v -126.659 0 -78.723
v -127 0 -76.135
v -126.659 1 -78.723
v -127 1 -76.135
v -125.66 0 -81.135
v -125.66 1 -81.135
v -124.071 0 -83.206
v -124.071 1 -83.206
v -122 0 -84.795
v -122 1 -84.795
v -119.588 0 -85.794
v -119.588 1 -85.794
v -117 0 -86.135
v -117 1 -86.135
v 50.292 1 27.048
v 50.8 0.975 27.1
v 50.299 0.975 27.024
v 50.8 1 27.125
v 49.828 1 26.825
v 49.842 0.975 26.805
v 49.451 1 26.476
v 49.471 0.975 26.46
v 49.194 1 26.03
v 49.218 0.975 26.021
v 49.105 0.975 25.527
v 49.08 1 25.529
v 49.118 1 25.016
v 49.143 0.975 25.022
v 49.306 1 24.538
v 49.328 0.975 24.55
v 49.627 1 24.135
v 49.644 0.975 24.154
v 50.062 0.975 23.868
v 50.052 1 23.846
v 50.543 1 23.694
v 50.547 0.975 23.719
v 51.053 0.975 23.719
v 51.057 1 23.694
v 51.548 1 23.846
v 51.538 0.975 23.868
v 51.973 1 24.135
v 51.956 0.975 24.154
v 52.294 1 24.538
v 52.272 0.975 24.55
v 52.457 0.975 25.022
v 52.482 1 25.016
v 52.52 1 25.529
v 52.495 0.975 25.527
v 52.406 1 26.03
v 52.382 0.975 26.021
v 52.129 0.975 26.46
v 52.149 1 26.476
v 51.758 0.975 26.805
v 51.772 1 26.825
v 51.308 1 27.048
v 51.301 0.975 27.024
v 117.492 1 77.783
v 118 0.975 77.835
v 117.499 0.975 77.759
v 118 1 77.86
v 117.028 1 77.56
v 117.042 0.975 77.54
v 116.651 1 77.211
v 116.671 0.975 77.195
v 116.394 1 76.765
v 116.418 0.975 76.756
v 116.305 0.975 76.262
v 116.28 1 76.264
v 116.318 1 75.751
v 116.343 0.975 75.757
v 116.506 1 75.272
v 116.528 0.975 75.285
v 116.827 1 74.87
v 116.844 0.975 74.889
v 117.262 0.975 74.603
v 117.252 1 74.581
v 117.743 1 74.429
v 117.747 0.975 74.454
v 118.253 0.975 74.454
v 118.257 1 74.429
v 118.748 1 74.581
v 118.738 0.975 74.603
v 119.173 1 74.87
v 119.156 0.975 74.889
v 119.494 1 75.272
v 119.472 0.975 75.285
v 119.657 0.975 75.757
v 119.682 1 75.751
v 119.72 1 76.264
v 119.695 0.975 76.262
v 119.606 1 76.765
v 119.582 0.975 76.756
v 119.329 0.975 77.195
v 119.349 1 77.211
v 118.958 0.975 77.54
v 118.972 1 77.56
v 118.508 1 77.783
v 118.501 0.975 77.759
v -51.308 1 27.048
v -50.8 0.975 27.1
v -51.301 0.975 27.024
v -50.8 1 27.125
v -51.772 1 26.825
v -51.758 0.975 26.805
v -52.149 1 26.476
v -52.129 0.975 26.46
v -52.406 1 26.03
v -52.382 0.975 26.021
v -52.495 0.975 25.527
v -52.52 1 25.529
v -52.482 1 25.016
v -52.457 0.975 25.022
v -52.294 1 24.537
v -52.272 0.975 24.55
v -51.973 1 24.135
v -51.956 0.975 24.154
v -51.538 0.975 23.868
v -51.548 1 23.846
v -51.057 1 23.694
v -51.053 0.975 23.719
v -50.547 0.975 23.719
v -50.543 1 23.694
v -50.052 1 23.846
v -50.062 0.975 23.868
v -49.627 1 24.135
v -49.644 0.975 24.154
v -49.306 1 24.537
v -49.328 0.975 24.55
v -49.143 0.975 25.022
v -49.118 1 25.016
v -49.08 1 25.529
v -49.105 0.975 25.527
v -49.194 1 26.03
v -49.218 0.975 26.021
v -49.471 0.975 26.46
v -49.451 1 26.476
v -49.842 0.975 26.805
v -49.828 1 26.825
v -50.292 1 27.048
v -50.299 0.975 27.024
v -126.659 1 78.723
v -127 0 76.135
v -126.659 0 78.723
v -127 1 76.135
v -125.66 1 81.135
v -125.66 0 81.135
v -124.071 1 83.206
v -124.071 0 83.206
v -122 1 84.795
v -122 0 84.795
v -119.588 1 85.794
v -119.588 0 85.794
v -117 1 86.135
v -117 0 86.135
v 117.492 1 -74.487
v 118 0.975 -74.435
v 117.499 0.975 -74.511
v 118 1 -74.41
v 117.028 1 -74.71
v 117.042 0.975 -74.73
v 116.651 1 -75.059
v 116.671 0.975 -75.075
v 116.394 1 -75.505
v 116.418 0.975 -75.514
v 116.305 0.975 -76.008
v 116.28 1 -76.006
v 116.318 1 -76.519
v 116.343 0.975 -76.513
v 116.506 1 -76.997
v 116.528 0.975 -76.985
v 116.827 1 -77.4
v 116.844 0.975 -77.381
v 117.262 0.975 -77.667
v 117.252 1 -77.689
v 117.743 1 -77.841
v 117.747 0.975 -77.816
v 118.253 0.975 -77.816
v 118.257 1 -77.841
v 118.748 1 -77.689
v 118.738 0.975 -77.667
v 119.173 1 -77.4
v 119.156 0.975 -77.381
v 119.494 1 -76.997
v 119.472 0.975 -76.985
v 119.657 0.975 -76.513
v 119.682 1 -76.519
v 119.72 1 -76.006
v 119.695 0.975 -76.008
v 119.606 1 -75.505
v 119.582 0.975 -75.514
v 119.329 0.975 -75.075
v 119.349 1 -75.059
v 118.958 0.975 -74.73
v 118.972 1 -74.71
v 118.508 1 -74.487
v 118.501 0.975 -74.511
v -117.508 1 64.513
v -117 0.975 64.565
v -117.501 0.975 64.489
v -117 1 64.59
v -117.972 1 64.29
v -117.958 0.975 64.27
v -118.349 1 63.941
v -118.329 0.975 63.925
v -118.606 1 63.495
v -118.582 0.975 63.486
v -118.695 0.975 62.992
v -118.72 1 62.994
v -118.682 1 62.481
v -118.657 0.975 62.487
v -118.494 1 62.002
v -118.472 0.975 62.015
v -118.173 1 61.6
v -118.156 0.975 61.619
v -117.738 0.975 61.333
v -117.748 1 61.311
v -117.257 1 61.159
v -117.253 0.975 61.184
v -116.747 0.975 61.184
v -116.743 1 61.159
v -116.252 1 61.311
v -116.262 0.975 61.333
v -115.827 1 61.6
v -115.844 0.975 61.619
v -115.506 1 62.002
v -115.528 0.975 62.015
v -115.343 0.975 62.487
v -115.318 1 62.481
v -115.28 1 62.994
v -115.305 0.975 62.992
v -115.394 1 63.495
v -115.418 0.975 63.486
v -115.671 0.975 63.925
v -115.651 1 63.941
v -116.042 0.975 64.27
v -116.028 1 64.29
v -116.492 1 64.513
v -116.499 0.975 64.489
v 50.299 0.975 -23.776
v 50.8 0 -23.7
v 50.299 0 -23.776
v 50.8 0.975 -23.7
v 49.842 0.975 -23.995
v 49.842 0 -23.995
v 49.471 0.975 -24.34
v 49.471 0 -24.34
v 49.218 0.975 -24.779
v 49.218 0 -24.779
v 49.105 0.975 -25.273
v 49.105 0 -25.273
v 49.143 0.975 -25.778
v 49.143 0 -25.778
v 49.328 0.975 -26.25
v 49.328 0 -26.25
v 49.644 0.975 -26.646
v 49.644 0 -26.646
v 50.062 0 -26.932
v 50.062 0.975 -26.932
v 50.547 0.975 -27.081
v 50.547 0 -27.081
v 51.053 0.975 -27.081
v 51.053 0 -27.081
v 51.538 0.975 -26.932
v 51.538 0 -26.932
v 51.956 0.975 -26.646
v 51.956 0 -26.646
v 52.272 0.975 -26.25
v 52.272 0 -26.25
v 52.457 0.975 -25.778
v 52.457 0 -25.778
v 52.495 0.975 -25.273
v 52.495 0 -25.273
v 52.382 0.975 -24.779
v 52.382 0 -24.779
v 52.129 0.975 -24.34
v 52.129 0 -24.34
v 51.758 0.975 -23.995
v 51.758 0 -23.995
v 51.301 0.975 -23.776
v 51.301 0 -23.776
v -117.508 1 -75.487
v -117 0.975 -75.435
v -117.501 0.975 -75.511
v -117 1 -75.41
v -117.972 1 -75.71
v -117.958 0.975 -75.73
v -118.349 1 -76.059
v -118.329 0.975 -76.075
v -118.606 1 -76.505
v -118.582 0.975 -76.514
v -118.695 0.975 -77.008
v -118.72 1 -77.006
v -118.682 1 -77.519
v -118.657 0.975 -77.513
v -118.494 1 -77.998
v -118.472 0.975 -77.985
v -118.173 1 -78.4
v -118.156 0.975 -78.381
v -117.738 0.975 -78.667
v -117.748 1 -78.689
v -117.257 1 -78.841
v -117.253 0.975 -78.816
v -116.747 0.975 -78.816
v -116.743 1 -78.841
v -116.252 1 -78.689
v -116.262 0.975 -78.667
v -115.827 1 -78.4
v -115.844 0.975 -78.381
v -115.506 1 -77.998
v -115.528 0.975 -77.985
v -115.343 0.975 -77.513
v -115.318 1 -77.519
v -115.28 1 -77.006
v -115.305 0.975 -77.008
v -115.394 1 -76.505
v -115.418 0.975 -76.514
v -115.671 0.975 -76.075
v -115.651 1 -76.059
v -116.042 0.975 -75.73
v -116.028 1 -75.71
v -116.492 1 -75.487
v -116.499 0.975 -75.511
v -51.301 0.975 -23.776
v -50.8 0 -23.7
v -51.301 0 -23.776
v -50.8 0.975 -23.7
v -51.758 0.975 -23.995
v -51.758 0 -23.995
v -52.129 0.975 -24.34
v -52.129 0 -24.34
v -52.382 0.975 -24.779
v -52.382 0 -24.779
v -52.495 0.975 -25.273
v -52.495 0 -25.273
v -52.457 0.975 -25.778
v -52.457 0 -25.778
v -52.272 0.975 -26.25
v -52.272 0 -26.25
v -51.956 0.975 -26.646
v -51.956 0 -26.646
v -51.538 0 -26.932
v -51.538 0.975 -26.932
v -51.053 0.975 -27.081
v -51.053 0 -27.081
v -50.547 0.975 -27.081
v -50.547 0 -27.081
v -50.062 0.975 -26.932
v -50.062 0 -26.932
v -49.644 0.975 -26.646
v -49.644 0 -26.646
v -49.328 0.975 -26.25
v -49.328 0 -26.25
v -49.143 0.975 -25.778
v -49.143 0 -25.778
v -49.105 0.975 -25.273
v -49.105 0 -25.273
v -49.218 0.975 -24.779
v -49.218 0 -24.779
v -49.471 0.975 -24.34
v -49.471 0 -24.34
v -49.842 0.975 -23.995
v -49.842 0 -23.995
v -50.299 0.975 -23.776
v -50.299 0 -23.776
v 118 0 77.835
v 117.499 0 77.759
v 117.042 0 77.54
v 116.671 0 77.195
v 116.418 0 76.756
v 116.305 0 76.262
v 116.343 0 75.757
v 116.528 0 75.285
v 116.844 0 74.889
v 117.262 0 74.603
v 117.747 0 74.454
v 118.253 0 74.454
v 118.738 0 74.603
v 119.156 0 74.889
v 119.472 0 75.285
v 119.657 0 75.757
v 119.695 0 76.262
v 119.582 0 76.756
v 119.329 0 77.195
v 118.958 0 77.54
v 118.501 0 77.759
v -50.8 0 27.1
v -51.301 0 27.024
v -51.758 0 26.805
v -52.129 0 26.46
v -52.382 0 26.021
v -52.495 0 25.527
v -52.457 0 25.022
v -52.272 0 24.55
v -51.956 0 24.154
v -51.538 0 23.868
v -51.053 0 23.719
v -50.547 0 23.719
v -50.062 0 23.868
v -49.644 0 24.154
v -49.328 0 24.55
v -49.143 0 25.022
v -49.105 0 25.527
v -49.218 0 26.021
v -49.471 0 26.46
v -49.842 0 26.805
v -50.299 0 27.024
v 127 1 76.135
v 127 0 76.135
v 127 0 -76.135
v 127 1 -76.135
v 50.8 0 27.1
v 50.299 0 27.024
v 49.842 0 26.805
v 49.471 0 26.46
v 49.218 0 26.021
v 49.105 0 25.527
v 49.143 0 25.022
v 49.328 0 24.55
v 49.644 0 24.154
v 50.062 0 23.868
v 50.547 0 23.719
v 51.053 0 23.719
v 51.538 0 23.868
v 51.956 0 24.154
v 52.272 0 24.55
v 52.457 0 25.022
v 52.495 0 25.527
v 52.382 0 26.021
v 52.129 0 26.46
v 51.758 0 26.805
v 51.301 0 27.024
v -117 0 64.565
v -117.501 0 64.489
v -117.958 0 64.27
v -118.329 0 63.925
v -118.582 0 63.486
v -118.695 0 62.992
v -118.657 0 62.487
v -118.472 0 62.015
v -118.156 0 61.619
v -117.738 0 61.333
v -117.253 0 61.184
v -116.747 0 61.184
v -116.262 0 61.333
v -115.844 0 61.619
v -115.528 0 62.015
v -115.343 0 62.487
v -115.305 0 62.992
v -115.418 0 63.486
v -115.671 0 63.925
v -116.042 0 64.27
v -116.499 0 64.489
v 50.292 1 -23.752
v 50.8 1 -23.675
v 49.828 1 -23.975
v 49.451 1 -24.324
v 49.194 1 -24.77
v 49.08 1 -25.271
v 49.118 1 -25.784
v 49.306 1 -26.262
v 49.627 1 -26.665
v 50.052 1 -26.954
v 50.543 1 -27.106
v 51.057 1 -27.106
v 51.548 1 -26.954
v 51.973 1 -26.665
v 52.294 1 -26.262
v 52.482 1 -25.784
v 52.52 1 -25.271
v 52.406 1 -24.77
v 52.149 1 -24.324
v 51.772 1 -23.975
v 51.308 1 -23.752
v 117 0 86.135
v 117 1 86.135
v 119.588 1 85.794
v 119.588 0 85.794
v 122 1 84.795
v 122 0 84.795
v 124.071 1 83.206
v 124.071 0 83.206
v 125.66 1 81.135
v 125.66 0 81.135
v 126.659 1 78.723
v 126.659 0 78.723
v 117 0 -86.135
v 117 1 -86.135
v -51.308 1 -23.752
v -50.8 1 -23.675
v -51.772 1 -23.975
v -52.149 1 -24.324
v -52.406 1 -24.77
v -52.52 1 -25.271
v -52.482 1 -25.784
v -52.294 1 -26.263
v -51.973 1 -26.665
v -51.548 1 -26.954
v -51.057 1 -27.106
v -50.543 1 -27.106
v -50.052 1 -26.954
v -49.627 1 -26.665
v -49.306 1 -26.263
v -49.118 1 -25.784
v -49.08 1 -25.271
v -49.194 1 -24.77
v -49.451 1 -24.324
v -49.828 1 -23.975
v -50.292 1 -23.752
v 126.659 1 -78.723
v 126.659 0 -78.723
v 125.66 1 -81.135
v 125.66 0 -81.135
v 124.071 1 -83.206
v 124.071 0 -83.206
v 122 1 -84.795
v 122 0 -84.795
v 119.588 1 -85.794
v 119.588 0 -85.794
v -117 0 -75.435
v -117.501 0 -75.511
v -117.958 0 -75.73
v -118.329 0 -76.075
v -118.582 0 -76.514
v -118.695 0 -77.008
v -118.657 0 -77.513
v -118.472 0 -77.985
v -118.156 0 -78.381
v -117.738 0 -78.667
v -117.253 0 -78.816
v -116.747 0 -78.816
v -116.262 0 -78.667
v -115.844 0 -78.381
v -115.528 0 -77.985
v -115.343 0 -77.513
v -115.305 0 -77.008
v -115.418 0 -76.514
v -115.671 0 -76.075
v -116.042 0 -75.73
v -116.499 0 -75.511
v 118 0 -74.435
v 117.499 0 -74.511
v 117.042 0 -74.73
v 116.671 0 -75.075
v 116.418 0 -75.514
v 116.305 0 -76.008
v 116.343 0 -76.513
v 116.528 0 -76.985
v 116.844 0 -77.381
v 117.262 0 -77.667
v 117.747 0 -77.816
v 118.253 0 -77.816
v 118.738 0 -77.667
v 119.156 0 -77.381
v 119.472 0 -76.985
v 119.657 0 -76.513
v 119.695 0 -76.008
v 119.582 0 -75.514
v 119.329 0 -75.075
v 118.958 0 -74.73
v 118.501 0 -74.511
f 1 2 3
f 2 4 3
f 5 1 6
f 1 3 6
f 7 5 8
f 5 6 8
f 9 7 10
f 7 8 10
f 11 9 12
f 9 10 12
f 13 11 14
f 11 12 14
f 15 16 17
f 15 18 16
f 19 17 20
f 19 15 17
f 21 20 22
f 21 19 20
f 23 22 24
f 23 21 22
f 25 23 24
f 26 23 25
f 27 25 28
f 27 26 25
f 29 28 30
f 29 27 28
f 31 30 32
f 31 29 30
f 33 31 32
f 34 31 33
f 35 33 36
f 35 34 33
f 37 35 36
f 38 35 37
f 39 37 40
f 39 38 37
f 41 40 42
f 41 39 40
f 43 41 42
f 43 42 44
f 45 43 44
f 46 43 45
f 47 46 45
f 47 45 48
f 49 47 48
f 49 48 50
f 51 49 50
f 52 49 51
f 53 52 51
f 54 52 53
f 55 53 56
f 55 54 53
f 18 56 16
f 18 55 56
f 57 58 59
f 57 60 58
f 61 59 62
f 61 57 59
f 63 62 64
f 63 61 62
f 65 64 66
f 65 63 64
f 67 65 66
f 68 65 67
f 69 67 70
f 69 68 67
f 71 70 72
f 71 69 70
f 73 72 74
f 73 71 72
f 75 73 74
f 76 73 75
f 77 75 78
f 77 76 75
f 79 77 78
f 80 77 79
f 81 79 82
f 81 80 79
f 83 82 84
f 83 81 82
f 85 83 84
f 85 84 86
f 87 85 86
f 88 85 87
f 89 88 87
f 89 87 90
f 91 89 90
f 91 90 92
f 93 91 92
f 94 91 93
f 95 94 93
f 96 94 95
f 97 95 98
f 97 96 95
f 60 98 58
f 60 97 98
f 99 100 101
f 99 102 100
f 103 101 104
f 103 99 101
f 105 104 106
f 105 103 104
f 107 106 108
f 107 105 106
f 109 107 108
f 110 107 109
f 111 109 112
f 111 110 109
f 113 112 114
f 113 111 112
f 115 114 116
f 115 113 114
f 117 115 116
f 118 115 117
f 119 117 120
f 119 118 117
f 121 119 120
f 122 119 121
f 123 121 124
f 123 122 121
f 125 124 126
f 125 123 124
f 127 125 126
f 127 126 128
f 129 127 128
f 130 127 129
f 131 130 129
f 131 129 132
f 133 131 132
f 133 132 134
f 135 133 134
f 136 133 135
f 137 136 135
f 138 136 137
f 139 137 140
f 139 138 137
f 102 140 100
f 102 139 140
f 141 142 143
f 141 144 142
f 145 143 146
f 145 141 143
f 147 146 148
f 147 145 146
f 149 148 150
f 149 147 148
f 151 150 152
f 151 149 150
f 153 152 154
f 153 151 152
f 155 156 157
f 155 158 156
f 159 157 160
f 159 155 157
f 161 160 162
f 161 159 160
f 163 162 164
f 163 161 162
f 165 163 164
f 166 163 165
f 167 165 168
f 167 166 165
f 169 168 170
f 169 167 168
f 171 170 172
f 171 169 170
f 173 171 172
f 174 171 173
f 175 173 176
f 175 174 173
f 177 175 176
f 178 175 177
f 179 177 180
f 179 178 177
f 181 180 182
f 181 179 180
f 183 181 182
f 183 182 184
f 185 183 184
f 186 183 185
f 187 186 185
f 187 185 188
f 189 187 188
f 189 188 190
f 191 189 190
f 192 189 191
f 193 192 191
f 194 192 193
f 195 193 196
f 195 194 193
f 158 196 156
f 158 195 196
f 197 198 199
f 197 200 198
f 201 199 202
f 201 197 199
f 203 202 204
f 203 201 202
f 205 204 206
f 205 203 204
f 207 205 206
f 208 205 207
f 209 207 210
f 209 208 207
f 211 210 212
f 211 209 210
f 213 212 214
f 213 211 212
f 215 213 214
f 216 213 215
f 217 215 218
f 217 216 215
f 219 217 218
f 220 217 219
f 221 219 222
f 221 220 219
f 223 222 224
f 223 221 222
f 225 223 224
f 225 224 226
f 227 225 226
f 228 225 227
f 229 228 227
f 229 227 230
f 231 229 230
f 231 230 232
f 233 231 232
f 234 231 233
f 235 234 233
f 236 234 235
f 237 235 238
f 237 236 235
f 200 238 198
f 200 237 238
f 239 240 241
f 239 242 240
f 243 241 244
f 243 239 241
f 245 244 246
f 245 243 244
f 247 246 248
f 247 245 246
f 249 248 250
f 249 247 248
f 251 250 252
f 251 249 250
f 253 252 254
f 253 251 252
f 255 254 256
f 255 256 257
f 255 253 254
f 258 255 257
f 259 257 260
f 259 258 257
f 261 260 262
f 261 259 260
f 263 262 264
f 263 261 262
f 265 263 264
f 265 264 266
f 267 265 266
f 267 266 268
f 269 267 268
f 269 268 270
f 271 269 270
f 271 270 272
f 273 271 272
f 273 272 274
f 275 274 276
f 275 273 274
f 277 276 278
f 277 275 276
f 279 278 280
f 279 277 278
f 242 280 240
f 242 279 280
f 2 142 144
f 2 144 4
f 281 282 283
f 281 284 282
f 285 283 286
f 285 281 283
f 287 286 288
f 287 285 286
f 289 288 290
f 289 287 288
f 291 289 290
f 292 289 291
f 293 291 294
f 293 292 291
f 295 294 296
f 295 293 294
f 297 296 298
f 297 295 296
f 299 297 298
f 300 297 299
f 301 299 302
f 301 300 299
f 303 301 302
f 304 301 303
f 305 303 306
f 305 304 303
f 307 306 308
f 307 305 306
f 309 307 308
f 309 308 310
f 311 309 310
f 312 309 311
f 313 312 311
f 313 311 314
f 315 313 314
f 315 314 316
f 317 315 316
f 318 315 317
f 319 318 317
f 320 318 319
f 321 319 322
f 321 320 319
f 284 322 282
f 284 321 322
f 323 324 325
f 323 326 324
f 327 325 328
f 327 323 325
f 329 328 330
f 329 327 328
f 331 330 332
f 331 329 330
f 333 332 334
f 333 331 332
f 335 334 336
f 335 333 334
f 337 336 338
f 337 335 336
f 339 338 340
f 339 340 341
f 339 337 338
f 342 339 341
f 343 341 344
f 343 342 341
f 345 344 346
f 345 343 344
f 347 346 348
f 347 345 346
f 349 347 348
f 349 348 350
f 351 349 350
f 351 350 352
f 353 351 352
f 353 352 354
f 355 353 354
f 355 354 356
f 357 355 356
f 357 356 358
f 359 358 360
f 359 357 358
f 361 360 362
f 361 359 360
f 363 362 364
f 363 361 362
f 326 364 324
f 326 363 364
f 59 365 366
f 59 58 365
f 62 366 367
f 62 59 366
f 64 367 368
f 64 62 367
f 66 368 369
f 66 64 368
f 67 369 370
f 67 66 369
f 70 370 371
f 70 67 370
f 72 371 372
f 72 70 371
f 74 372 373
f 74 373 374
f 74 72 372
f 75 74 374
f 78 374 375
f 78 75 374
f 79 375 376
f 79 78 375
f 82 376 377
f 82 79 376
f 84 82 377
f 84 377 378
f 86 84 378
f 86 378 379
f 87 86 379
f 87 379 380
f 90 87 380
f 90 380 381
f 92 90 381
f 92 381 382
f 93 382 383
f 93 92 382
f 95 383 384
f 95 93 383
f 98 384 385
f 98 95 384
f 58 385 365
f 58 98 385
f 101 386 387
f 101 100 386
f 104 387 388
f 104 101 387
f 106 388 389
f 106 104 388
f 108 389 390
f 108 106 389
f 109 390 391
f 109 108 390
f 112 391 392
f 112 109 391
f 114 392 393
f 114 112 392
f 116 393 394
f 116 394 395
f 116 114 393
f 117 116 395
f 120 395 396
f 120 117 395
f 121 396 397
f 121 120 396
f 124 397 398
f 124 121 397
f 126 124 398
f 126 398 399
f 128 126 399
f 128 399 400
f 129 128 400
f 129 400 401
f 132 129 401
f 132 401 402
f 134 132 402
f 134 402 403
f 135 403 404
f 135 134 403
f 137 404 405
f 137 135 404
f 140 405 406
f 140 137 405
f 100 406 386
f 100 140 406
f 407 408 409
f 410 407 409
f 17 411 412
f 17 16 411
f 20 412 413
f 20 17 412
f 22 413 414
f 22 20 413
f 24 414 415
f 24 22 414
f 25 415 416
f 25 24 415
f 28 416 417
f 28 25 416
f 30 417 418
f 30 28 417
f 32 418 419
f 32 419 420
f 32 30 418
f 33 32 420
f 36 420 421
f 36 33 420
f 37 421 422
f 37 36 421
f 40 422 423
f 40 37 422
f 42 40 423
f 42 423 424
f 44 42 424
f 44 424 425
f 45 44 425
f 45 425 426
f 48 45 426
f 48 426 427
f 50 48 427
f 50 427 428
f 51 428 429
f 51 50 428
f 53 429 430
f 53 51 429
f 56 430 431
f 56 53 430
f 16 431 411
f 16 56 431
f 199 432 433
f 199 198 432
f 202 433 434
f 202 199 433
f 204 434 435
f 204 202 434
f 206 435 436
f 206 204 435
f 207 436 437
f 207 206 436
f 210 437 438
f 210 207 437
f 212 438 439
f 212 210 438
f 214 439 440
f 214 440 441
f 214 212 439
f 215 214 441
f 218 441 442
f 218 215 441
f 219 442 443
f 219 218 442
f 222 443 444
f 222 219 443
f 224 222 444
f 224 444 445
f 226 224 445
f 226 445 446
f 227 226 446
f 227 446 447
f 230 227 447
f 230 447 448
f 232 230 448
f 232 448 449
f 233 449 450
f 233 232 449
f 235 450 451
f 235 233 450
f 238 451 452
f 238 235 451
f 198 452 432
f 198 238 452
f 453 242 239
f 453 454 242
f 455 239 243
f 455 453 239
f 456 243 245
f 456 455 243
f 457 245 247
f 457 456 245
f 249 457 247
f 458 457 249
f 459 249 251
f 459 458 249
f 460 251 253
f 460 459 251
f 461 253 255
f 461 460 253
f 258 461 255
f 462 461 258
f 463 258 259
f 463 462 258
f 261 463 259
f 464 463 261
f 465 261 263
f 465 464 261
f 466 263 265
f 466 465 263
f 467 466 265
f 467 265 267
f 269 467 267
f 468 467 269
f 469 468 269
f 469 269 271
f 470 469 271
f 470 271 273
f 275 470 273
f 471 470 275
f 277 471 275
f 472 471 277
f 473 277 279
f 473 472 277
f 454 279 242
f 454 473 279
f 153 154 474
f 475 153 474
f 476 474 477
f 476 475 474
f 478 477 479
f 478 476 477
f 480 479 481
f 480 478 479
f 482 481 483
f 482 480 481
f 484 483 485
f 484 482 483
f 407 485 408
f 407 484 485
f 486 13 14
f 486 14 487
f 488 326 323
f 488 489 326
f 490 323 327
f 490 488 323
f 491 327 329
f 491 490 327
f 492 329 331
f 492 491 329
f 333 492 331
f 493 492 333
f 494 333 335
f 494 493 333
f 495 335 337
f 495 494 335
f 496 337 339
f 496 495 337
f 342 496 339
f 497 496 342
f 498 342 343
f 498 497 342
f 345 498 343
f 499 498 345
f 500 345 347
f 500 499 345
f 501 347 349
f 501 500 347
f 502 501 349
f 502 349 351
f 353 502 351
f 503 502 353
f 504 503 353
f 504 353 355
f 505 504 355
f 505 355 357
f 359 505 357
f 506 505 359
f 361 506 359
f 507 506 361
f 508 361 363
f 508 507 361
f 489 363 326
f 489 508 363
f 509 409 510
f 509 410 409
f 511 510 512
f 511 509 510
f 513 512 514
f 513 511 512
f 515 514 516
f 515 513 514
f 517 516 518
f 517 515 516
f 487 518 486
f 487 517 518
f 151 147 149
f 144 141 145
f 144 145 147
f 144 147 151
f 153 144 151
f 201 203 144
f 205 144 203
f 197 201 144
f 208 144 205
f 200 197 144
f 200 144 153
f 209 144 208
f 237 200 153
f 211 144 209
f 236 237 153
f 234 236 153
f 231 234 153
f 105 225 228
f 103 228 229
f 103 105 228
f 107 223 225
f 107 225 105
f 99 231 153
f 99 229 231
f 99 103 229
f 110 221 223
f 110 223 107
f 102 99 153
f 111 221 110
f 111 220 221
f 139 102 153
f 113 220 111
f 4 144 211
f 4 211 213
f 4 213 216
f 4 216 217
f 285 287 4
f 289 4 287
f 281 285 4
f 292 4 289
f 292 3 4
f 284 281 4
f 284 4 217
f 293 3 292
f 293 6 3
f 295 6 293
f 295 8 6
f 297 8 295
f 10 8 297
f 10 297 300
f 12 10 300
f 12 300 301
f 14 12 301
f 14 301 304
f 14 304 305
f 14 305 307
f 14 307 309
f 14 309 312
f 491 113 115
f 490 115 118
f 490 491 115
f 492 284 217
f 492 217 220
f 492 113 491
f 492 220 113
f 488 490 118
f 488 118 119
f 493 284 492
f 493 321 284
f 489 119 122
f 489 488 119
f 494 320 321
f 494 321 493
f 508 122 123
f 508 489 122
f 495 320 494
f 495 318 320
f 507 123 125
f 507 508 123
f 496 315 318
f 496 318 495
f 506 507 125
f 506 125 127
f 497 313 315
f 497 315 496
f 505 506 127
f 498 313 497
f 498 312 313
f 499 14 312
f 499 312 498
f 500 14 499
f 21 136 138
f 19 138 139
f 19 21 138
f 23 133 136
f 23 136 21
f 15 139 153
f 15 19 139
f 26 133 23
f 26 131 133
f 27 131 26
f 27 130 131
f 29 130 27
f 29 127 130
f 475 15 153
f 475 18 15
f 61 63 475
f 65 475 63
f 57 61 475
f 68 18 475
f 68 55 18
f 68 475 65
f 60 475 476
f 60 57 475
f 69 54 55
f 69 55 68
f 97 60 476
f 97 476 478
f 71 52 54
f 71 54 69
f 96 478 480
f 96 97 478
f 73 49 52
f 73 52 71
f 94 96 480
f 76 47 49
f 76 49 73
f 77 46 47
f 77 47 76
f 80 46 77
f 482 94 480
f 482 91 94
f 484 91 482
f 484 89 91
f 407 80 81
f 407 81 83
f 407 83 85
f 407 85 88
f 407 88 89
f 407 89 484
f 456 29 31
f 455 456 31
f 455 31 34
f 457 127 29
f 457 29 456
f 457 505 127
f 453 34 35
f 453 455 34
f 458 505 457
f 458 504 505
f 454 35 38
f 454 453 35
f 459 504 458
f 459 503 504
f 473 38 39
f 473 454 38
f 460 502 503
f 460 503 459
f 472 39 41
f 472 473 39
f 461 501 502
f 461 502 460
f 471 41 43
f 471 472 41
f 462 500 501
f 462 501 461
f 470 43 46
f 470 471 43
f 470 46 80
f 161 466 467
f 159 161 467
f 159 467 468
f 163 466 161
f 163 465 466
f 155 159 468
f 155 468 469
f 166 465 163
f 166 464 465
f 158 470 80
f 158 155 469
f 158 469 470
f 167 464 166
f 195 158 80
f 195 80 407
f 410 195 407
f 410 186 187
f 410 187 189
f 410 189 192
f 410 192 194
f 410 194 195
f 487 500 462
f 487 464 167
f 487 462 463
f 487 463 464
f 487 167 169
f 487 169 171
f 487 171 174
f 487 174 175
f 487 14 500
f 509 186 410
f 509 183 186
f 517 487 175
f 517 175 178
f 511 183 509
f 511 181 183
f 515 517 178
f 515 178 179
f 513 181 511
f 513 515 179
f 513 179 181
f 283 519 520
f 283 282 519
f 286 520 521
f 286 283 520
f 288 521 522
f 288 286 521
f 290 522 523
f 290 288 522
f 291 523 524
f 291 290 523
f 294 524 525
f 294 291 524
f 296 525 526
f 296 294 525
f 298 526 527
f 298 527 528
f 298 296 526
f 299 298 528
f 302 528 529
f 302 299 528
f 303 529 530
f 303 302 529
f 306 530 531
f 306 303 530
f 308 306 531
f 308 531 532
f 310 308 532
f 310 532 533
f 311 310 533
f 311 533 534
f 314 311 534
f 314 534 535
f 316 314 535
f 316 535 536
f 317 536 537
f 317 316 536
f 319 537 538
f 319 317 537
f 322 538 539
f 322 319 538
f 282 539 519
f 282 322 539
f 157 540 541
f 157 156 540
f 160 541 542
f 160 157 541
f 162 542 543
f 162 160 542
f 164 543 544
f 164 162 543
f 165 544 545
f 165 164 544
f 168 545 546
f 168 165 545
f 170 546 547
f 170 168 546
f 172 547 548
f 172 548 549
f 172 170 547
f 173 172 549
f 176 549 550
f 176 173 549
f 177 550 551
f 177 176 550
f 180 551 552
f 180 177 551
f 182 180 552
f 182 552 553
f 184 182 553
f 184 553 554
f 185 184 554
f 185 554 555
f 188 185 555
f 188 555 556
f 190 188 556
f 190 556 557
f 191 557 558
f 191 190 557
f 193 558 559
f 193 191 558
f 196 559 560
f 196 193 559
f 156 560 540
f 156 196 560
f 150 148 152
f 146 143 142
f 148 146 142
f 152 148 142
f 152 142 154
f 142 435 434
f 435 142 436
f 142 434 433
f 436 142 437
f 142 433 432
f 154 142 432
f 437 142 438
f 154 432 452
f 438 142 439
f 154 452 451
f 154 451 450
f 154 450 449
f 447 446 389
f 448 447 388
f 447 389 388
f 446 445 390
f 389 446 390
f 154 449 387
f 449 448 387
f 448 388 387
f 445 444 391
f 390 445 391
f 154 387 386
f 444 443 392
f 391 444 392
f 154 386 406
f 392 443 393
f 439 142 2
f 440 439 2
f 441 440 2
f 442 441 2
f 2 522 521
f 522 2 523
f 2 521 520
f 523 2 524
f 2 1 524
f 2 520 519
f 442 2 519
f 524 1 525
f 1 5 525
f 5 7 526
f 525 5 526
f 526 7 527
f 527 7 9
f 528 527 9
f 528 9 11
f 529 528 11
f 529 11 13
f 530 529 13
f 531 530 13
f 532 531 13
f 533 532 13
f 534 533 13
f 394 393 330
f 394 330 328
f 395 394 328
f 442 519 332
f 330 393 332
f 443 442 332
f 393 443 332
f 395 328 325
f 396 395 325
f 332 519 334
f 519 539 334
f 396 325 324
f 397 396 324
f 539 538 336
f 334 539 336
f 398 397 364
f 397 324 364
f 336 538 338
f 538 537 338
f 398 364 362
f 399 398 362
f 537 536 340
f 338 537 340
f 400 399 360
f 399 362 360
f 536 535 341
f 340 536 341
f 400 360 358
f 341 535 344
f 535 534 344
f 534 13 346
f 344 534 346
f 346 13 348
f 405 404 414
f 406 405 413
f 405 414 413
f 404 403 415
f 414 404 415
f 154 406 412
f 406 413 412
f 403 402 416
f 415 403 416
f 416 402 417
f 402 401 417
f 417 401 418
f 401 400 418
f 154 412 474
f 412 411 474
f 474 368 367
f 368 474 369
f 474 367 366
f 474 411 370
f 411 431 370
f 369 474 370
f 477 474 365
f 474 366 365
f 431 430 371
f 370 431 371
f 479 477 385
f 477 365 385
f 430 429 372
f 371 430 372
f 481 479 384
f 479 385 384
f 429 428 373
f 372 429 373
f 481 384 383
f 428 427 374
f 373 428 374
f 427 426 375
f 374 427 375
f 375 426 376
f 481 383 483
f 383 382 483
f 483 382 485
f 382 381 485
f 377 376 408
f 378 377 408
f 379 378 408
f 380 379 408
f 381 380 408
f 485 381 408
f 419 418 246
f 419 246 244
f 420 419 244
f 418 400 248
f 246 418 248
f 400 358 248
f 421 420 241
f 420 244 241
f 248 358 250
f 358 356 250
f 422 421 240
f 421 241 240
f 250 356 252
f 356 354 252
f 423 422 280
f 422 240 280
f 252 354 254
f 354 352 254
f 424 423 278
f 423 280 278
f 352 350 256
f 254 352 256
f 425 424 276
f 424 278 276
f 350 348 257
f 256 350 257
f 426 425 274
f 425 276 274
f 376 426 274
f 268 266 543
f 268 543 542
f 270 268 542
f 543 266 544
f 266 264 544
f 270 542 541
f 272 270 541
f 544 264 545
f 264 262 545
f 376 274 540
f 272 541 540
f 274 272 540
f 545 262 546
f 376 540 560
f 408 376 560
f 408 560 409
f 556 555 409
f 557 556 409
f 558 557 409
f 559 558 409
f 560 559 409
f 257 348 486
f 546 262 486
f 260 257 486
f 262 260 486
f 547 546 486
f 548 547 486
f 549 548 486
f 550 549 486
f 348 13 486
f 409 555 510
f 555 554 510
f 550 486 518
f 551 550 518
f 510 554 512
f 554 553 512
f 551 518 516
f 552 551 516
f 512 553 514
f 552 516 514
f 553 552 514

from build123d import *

# Parameters (mm, degrees)
SKETCH1_W                     = 254
SKETCH1_H                     = 172.27
BOSS_EXTRUDE1_DEPTH           = 1
FILLET1_R                     = 10
M3_CLEARANCE_HOLE1_AT_2_COUNT = 2
M3_CLEARANCE_HOLE1_AT_2_PITCH = 140
M3_CLEARANCE_HOLE1_AT_3_COUNT = 2
M3_CLEARANCE_HOLE1_AT_3_PITCH = 280.564953086
M3_CLEARANCE_HOLE1_AT_4_COUNT = 2
M3_CLEARANCE_HOLE1_AT_4_PITCH = 235.00212765
M3_CLEARANCE_HOLE1_AT_5_COUNT = 2
M3_CLEARANCE_HOLE1_AT_5_PITCH = 122.048622381
M3_CLEARANCE_HOLE1_AT_6_COUNT = 2
M3_CLEARANCE_HOLE1_AT_6_PITCH = 196.647568571
M3_CLEARANCE_HOLE1_AT_7_COUNT = 2
M3_CLEARANCE_HOLE1_AT_7_PITCH = 84.017559028
M3_CLEARANCE_HOLE1_AT_8_COUNT = 2
M3_CLEARANCE_HOLE1_AT_8_PITCH = 175.594277313


with BuildPart() as part:
    # Sketch1 → Boss-Extrude1 (new body)
    with BuildSketch(Plane(origin=(0, 0, 0), x_dir=(1, 0, 0), z_dir=(0, 1, 0))):
        Rectangle(SKETCH1_W, SKETCH1_H)
    extrude(amount=BOSS_EXTRUDE1_DEPTH)

    # Fillet1
    fillet1_edges = [part.edges().sort_by_distance(p)[0] for p in [
        (127, 0.5, 86.135),
        (-127, 0.5, 86.135),
        (-127, 0.5, -86.135),
        (127, 0.5, -86.135),
    ]]
    fillet(fillet1_edges, radius=FILLET1_R)

    # Sketch3 → M3 Clearance Hole1 (revolve, cut)
    with BuildSketch(Plane(origin=(-117, 1, -77.135), x_dir=(0, 0, 1), z_dir=(1, 0, 0))):
        Polygon((0, 0), (0, 1), (1.7, 1), (1.7, 0.025), (1.725, 0), align=None)
    m3_clearance_hole1 = revolve(axis=Axis((-117, 7.35, -77.135), (0, -1, 0)), mode=Mode.SUBTRACT)

    # M3 Clearance Hole1 at 2: M3 Clearance Hole1 ×2
    with Locations(*[(0, 0, i * M3_CLEARANCE_HOLE1_AT_2_PITCH) for i in range(1, M3_CLEARANCE_HOLE1_AT_2_COUNT)]):
        add(m3_clearance_hole1, mode=Mode.SUBTRACT)

    # M3 Clearance Hole1 at 3: M3 Clearance Hole1 ×2
    with Locations(*[Vector(0.837595706, 0, 0.546290612) * (i * M3_CLEARANCE_HOLE1_AT_3_PITCH) for i in range(1, M3_CLEARANCE_HOLE1_AT_3_COUNT)]):
        add(m3_clearance_hole1, mode=Mode.SUBTRACT)

    # M3 Clearance Hole1 at 4: M3 Clearance Hole1 ×2
    with Locations(*[Vector(0.999990946, 0, 0.004255281) * (i * M3_CLEARANCE_HOLE1_AT_4_PITCH) for i in range(1, M3_CLEARANCE_HOLE1_AT_4_COUNT)]):
        add(m3_clearance_hole1, mode=Mode.SUBTRACT)

    # M3 Clearance Hole1 at 5: M3 Clearance Hole1 ×2
    with Locations(*[Vector(0.542406778, 0, 0.840115996) * (i * M3_CLEARANCE_HOLE1_AT_5_PITCH) for i in range(1, M3_CLEARANCE_HOLE1_AT_5_COUNT)]):
        add(m3_clearance_hole1, mode=Mode.SUBTRACT)

    # M3 Clearance Hole1 at 6: M3 Clearance Hole1 ×2
    with Locations(*[Vector(0.853303202, 0, 0.521415041) * (i * M3_CLEARANCE_HOLE1_AT_6_PITCH) for i in range(1, M3_CLEARANCE_HOLE1_AT_6_COUNT)]):
        add(m3_clearance_hole1, mode=Mode.SUBTRACT)

    # M3 Clearance Hole1 at 7: M3 Clearance Hole1 ×2
    with Locations(*[Vector(0.787930532, 0, 0.61576414) * (i * M3_CLEARANCE_HOLE1_AT_7_PITCH) for i in range(1, M3_CLEARANCE_HOLE1_AT_7_COUNT)]):
        add(m3_clearance_hole1, mode=Mode.SUBTRACT)

    # M3 Clearance Hole1 at 8: M3 Clearance Hole1 ×2
    with Locations(*[Vector(0.955612008, 0, 0.294628053) * (i * M3_CLEARANCE_HOLE1_AT_8_PITCH) for i in range(1, M3_CLEARANCE_HOLE1_AT_8_COUNT)]):
        add(m3_clearance_hole1, mode=Mode.SUBTRACT)


solid = part.part
